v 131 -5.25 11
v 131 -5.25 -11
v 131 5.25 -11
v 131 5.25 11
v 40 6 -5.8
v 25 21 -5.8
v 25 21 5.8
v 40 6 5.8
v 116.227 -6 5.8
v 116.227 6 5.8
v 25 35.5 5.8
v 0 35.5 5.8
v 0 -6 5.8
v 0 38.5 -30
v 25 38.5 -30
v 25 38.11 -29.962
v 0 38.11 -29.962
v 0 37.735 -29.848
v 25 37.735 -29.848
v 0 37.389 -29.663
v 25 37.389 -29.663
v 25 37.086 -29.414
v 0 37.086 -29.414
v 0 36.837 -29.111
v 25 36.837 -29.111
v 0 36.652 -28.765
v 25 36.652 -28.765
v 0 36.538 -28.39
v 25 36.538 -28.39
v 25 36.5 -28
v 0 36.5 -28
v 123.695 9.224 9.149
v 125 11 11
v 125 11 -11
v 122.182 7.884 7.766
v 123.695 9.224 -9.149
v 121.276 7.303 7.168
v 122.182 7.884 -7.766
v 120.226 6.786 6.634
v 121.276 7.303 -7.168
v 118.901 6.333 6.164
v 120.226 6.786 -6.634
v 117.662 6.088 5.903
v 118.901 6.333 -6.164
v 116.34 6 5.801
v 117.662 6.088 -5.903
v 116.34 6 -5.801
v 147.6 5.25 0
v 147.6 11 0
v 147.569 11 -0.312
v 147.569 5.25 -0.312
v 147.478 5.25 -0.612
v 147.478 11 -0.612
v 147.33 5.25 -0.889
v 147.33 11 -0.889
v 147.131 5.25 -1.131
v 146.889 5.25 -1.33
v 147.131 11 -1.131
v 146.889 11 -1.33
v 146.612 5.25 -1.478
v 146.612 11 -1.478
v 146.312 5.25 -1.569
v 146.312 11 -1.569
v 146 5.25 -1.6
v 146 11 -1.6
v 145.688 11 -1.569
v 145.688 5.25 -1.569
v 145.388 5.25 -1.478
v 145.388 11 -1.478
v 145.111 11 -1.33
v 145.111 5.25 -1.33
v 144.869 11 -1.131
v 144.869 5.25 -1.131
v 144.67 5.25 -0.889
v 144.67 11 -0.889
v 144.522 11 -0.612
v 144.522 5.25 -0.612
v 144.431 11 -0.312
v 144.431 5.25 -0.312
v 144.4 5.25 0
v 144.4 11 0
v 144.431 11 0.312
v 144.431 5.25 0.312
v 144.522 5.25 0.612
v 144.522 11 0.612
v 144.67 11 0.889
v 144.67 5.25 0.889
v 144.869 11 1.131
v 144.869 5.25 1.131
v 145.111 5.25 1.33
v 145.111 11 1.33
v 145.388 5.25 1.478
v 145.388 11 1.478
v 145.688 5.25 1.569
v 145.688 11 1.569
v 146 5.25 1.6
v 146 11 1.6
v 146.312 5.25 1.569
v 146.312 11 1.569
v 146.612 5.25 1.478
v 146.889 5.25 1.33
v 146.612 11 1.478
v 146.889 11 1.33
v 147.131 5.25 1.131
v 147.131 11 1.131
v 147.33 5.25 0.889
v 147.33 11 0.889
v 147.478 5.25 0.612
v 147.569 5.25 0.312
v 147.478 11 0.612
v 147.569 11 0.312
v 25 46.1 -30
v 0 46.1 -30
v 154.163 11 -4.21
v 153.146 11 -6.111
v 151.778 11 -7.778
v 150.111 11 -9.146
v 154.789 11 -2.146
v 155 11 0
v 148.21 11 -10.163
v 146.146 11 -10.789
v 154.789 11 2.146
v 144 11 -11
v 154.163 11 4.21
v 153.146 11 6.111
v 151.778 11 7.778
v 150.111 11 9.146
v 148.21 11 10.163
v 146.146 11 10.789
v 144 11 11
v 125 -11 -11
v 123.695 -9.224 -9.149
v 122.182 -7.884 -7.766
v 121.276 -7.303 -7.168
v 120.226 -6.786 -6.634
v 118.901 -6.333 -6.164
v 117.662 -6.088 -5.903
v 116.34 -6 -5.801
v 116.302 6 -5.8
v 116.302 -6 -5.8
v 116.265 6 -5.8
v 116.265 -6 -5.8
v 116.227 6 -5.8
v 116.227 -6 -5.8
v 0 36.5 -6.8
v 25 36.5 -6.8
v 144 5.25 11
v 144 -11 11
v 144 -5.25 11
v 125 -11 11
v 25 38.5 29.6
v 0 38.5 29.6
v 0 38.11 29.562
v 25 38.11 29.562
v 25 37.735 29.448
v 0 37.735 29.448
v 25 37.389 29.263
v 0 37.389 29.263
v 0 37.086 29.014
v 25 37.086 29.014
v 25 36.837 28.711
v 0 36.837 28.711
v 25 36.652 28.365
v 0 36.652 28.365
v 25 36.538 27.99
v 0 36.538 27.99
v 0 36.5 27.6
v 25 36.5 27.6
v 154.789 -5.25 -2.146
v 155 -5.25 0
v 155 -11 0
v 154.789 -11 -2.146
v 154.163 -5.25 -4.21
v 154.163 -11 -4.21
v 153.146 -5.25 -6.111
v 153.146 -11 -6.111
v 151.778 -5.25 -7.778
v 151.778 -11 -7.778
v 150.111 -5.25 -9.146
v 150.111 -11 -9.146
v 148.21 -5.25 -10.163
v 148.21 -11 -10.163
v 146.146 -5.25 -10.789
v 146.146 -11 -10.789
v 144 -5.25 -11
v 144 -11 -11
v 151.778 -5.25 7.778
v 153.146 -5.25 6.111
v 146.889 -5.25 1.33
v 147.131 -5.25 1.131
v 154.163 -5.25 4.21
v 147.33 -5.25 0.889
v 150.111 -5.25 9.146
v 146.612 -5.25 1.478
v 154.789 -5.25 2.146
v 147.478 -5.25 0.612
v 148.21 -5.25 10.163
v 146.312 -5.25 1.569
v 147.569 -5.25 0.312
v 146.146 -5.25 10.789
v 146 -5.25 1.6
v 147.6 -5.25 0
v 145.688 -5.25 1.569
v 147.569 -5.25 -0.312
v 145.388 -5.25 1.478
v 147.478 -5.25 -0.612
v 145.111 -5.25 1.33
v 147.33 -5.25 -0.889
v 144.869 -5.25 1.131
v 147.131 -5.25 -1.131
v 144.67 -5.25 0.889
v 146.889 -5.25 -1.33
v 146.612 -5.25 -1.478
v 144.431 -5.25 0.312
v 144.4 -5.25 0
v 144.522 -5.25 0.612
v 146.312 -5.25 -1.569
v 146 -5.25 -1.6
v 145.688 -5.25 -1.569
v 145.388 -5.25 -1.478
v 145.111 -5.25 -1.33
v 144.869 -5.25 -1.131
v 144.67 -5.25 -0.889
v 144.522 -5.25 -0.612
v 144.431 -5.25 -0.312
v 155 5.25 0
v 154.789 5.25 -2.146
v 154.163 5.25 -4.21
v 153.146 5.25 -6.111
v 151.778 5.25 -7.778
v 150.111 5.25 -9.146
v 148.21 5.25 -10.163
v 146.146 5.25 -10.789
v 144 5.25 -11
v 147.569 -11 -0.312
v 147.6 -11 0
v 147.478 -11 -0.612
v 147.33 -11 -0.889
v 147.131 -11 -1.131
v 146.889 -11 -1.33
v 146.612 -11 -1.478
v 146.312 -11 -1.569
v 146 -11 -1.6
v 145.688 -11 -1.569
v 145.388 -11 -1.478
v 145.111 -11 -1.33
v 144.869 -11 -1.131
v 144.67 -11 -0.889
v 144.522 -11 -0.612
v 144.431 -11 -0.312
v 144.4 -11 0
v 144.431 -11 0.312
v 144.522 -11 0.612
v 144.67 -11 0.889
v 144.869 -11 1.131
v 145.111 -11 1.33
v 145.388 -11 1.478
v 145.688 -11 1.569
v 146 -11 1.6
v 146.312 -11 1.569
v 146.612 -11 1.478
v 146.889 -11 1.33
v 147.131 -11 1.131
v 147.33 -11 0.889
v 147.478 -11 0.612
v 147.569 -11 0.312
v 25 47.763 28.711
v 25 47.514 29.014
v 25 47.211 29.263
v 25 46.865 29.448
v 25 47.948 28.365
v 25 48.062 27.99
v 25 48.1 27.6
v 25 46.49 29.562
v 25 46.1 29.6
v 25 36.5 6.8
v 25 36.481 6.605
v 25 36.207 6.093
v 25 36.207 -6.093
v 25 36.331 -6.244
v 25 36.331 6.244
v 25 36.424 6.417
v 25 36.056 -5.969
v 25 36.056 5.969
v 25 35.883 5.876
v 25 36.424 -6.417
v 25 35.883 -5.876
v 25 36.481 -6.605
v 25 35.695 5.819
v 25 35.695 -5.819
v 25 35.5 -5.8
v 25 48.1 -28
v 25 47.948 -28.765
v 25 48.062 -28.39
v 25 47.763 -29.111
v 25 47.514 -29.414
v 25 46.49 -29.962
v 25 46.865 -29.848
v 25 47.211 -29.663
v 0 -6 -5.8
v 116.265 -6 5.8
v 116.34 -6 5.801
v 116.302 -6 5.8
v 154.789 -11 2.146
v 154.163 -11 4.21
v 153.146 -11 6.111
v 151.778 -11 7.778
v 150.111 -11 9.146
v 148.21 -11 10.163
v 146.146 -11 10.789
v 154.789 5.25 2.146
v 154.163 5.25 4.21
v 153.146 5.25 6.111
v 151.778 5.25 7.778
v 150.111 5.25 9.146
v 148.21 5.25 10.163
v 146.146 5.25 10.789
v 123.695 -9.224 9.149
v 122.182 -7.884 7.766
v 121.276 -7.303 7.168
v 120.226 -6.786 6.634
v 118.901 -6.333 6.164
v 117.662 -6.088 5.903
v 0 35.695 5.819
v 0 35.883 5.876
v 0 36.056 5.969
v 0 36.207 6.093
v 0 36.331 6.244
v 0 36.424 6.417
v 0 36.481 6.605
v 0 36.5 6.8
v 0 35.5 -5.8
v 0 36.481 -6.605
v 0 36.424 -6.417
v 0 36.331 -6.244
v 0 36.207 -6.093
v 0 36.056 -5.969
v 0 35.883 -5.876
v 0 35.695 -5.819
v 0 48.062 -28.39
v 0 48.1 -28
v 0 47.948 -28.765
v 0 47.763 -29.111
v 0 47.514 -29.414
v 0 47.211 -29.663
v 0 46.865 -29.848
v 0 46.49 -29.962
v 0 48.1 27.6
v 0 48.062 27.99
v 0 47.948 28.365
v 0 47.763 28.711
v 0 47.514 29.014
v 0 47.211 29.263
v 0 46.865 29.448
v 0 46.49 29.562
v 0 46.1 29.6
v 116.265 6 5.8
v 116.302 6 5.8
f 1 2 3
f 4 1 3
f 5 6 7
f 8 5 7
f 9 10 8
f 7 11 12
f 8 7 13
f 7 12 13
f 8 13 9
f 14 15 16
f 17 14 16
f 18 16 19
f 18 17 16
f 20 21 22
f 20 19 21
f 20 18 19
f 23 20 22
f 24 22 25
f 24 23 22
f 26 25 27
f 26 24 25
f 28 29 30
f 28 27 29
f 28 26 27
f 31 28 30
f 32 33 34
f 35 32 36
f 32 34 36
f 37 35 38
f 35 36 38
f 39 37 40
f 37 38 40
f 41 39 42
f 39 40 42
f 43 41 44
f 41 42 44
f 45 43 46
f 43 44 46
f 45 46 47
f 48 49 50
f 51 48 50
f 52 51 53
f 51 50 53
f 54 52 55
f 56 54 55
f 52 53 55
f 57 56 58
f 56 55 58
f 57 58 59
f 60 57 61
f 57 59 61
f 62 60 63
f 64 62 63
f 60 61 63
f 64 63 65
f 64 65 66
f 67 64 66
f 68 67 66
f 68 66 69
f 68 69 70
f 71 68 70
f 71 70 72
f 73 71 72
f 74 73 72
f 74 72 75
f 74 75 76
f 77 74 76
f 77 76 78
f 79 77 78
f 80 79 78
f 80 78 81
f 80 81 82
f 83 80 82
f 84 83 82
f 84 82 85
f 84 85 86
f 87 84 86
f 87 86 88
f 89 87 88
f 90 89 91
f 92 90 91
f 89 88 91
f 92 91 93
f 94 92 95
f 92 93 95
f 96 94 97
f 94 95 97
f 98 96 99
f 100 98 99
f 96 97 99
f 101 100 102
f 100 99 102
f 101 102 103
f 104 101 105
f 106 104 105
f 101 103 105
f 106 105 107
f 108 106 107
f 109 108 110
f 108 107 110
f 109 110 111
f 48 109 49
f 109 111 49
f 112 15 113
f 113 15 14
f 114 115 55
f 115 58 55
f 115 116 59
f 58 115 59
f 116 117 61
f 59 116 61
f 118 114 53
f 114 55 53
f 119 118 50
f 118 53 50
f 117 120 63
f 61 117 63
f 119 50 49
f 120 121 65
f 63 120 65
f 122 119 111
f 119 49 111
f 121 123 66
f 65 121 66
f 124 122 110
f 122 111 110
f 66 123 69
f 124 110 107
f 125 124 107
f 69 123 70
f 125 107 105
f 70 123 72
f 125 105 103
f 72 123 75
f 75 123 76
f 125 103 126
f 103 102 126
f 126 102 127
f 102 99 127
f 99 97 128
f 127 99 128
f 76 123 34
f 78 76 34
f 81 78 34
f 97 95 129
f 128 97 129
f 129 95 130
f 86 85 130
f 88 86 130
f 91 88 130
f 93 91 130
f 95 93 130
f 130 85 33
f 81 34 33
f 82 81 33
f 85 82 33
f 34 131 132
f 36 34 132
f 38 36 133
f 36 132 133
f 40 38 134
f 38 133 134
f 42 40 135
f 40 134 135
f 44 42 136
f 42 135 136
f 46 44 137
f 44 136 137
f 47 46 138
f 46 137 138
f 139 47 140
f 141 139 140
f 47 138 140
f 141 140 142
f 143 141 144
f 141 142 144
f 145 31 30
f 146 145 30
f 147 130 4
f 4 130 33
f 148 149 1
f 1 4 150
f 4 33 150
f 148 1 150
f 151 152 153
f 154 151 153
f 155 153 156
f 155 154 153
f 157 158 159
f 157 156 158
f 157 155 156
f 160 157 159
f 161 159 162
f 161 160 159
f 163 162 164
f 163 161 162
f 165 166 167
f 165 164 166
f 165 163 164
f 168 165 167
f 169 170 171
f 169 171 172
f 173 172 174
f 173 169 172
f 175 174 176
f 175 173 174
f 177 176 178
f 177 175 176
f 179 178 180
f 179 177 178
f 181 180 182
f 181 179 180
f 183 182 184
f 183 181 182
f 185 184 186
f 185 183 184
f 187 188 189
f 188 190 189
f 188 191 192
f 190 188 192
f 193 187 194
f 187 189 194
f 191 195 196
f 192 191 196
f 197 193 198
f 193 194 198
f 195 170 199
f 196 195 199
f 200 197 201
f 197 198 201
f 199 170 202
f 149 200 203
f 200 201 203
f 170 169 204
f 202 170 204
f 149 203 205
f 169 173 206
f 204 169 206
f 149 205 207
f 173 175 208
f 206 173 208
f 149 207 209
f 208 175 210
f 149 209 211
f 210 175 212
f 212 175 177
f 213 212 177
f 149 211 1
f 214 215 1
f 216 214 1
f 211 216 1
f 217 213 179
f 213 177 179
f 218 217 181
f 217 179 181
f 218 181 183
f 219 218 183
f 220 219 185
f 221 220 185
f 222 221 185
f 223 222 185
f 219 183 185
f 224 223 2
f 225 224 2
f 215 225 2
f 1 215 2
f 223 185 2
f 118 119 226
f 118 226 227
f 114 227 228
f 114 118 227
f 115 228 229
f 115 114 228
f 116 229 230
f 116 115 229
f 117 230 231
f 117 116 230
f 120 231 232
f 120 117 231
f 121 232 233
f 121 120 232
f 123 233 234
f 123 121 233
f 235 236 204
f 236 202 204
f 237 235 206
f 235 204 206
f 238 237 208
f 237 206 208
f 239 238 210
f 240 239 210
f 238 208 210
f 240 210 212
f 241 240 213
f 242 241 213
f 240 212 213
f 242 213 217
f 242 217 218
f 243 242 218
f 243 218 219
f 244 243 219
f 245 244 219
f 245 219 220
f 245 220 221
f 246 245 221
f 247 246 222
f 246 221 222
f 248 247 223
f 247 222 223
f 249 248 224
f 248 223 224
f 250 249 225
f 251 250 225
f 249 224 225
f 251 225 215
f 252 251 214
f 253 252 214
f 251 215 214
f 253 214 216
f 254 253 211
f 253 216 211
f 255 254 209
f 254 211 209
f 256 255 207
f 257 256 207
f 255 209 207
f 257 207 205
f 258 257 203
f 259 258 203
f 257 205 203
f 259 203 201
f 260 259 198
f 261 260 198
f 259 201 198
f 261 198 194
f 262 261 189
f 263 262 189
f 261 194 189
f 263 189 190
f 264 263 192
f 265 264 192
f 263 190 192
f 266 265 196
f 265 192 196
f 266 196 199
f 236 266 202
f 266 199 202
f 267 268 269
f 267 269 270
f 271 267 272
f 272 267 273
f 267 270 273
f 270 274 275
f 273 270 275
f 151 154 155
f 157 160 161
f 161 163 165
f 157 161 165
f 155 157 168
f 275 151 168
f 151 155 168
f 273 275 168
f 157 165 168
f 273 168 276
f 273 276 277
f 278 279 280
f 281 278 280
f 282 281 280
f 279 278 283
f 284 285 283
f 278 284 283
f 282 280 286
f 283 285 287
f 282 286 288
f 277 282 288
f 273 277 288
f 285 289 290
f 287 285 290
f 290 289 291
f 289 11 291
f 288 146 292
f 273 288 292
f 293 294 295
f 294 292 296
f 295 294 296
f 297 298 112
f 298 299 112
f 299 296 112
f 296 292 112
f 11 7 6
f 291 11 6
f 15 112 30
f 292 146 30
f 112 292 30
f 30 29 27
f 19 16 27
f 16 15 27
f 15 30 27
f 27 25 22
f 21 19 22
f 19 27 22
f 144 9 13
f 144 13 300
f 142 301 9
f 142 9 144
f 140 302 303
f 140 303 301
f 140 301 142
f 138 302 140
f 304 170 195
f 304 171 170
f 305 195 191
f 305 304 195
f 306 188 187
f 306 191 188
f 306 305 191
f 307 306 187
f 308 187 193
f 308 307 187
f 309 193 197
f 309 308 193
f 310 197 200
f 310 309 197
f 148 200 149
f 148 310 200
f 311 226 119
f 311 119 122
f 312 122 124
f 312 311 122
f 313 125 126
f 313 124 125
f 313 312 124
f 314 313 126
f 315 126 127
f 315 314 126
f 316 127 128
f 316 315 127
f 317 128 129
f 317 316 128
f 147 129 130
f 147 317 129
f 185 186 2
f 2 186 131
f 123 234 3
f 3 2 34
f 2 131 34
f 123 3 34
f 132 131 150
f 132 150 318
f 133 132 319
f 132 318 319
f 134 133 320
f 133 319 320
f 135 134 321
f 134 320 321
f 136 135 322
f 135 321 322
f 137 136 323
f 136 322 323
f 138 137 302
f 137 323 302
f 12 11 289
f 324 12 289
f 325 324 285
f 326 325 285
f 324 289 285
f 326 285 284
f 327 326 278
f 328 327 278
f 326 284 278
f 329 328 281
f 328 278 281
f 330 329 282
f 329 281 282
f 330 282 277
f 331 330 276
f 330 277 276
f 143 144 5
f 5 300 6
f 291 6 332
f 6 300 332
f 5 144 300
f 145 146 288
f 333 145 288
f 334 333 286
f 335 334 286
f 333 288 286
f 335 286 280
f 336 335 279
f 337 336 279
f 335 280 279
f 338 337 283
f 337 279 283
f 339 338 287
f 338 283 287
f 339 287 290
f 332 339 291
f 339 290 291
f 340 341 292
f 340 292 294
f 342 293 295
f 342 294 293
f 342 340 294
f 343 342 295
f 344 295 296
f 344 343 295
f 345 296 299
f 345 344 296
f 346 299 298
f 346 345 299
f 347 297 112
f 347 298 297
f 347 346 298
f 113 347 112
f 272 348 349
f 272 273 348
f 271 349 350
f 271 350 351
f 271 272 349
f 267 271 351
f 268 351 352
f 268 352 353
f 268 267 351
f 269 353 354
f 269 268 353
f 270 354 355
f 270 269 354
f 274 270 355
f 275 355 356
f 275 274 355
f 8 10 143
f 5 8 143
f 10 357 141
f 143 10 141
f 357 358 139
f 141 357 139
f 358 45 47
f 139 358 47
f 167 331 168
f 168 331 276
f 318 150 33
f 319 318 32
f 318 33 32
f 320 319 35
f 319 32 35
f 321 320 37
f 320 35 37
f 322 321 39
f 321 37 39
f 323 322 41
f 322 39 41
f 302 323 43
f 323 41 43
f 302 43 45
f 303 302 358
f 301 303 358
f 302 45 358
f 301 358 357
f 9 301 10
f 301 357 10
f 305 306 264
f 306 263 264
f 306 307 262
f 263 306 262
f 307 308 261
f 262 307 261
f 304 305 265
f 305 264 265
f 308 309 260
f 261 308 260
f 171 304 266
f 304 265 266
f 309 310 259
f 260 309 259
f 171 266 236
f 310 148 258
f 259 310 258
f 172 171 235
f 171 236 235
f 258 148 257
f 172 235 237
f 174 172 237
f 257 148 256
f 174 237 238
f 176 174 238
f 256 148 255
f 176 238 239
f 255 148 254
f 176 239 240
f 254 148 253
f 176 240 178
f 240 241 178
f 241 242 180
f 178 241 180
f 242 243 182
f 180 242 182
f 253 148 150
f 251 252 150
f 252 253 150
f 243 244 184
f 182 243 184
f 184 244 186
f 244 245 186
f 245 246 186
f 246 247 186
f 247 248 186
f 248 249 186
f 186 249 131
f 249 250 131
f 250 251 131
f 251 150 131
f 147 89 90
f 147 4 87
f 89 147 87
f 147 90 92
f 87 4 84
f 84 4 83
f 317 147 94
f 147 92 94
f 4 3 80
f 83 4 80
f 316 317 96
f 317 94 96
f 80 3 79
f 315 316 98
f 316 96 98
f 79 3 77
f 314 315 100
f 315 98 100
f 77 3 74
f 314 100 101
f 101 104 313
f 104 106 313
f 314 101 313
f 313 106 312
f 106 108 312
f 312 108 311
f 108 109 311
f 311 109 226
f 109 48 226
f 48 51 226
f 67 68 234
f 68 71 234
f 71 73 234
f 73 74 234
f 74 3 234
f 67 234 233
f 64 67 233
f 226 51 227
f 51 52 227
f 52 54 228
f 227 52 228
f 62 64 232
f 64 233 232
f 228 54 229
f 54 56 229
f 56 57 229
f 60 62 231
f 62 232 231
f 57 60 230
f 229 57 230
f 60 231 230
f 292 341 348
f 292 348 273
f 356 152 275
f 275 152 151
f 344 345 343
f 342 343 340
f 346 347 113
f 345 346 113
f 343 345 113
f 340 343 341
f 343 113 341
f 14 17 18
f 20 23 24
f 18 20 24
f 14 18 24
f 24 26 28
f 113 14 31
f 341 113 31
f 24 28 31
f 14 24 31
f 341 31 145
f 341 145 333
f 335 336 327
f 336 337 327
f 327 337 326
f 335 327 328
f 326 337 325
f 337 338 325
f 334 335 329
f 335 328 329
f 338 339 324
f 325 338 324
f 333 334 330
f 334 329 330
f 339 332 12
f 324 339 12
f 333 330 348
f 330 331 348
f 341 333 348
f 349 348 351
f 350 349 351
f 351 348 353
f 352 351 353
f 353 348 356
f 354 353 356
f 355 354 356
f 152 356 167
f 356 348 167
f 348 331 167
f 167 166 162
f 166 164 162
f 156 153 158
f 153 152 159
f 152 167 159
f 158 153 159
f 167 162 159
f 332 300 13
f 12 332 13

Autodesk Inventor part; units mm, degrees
ref_plane "YZ Plane" through (0, 0, 0) normal (1, 0, 0) x (0, 1, 0)
ref_plane "XZ Plane" through (0, 0, 0) normal (0, 1, 0) x (-1, 0, 0)
ref_plane "XY Plane" through (0, 0, 0) normal (0, 0, 1) x (1, 0, 0)
sketch "草圖1" plane through (0, 0, 0) normal (1, 0, 0) x (0, 1, 0)
  line L0 (6, 5.8) -> (-6, 5.8)
  line L1 (-6, 5.8) -> (-6, -5.8)
  line L2 (-6, -5.8) -> (6, -5.8)
  line L3 (6, -5.8) -> (6, 5.8)
  line L4 (6, 5.8) -> (-6, -5.8) construction
  line L5 (-6, 5.8) -> (6, -5.8) construction
  point P0 (0, 0)
  dimension "d2" = 12
  dimension "d3" = 11.6
extrude "擠出1" add sketch "草圖1" along normal blind 125
sketch "草圖2" plane through (0, 6, 5.8) normal (0, 1, 0) x (1, 0, 0)
  line L0 (0, 0) -> (125, 0) projected
  line L1 (0, 11.6) -> (125, 11.6) projected
  line L2 (0, 0) -> (25, 0)
  line L3 (25, 0) -> (25, 11.6)
  line L4 (25, 11.6) -> (0, 11.6)
  line L5 (0, 11.6) -> (0, 0)
  point P0 (0, 5.8)
  point P1 (0, 11.6)
  dimension "d6" = 25
extrude "擠出2" add sketch "草圖2" along normal blind 30.5
sketch "草圖3" plane through (0, 36.5, 5.8) normal (0, 1, 0) x (1, 0, 0)
  line L0 (25, 35.8) -> (0, 35.8)
  line L1 (0, 35.8) -> (0, -23.8)
  line L2 (0, -23.8) -> (25, -23.8)
  line L3 (25, -23.8) -> (25, 35.8)
  line L4 (25, 0) -> (25, 11.6) projected
  line L5 (25, 0) -> (125, 0) projected
  point P0 (0, 5.8)
  point P1 (25, 5.8)
  dimension "d9" = 25
  dimension "d10" = 59.6
  dimension "d11" = 23.8
extrude "擠出3" add sketch "草圖3" along normal blind 11.6
sketch "草圖4" plane through (125, 0, 0) normal (1, 0, 0) x (0, 0, -1)
  line L0 (-11, -11) -> (11, -11)
  line L1 (11, -11) -> (11, 11)
  line L2 (11, 11) -> (-11, 11)
  line L3 (-11, 11) -> (-11, -11)
  line L4 (-11, -11) -> (11, 11) construction
  line L5 (11, -11) -> (-11, 11) construction
  point P0 (0, 0)
  dimension "d14" = 22
  dimension "d15" = 22
extrude "擠出4" add sketch "草圖4" along normal blind 30
sketch "草圖5" plane through (125, -11, -11) normal (0, 0, -1) x (-1, 0, 0)
  line L0 (-30, 0) -> (-30, 22) projected
  line L1 (-30, 5.75) -> (-6, 5.75)
  line L2 (-6, 5.75) -> (-6, 16.25)
  line L3 (-6, 16.25) -> (-30, 16.25)
  line L4 (-30, 16.25) -> (-30, 5.75)
  line L5 (0, 17) -> (0, 5) projected
  line L6 (0, 11) -> (-32.9331, 11) construction
  point P0 (125, 11)
  dimension "d18" = 10.5
  dimension "d19" = 24
extrude "擠出5" cut sketch "草圖5" against normal blind 30
sketch "草圖6" plane through (125, 11, 11) normal (0, 1, 0) x (1, 0, 0)
  line L0 (6, 22) -> (6, 0) construction
  line L1 (6, 22) -> (6, 0) construction
  line L2 (6, 11) -> (33.0459, 11) construction
  circle A0 centre (21, 11) radius 1.6
  point P0 (-125, 11)
  dimension "d22" = 15
  dimension "d23" = 3.2
extrude "擠出6" cut sketch "草圖6" against normal blind 30
fillet "圓角1" radius 11 4 edges at (155, 8.125, -11) (155, 8.125, 11) (155, -8.125, 11) (155, -8.125, -11)
fillet "圓角2" radius 10 4 edges at (125, 6, 0) (125, 0, 5.8) (125, 0, -5.8) (125, -6, 0)
chamfer "倒角1" distance 15 angle 45 1 edges at (25, 6, 0)
fillet "圓角3" radius 2 4 edges at (12.5, 48.1, -30) (12.5, 36.5, -30) (12.5, 36.5, 29.6) (12.5, 48.1, 29.6)
fillet "圓角4" radius 1 2 edges at (12.5, 36.5, 5.8) (12.5, 36.5, -5.8)
properties part number "support"
